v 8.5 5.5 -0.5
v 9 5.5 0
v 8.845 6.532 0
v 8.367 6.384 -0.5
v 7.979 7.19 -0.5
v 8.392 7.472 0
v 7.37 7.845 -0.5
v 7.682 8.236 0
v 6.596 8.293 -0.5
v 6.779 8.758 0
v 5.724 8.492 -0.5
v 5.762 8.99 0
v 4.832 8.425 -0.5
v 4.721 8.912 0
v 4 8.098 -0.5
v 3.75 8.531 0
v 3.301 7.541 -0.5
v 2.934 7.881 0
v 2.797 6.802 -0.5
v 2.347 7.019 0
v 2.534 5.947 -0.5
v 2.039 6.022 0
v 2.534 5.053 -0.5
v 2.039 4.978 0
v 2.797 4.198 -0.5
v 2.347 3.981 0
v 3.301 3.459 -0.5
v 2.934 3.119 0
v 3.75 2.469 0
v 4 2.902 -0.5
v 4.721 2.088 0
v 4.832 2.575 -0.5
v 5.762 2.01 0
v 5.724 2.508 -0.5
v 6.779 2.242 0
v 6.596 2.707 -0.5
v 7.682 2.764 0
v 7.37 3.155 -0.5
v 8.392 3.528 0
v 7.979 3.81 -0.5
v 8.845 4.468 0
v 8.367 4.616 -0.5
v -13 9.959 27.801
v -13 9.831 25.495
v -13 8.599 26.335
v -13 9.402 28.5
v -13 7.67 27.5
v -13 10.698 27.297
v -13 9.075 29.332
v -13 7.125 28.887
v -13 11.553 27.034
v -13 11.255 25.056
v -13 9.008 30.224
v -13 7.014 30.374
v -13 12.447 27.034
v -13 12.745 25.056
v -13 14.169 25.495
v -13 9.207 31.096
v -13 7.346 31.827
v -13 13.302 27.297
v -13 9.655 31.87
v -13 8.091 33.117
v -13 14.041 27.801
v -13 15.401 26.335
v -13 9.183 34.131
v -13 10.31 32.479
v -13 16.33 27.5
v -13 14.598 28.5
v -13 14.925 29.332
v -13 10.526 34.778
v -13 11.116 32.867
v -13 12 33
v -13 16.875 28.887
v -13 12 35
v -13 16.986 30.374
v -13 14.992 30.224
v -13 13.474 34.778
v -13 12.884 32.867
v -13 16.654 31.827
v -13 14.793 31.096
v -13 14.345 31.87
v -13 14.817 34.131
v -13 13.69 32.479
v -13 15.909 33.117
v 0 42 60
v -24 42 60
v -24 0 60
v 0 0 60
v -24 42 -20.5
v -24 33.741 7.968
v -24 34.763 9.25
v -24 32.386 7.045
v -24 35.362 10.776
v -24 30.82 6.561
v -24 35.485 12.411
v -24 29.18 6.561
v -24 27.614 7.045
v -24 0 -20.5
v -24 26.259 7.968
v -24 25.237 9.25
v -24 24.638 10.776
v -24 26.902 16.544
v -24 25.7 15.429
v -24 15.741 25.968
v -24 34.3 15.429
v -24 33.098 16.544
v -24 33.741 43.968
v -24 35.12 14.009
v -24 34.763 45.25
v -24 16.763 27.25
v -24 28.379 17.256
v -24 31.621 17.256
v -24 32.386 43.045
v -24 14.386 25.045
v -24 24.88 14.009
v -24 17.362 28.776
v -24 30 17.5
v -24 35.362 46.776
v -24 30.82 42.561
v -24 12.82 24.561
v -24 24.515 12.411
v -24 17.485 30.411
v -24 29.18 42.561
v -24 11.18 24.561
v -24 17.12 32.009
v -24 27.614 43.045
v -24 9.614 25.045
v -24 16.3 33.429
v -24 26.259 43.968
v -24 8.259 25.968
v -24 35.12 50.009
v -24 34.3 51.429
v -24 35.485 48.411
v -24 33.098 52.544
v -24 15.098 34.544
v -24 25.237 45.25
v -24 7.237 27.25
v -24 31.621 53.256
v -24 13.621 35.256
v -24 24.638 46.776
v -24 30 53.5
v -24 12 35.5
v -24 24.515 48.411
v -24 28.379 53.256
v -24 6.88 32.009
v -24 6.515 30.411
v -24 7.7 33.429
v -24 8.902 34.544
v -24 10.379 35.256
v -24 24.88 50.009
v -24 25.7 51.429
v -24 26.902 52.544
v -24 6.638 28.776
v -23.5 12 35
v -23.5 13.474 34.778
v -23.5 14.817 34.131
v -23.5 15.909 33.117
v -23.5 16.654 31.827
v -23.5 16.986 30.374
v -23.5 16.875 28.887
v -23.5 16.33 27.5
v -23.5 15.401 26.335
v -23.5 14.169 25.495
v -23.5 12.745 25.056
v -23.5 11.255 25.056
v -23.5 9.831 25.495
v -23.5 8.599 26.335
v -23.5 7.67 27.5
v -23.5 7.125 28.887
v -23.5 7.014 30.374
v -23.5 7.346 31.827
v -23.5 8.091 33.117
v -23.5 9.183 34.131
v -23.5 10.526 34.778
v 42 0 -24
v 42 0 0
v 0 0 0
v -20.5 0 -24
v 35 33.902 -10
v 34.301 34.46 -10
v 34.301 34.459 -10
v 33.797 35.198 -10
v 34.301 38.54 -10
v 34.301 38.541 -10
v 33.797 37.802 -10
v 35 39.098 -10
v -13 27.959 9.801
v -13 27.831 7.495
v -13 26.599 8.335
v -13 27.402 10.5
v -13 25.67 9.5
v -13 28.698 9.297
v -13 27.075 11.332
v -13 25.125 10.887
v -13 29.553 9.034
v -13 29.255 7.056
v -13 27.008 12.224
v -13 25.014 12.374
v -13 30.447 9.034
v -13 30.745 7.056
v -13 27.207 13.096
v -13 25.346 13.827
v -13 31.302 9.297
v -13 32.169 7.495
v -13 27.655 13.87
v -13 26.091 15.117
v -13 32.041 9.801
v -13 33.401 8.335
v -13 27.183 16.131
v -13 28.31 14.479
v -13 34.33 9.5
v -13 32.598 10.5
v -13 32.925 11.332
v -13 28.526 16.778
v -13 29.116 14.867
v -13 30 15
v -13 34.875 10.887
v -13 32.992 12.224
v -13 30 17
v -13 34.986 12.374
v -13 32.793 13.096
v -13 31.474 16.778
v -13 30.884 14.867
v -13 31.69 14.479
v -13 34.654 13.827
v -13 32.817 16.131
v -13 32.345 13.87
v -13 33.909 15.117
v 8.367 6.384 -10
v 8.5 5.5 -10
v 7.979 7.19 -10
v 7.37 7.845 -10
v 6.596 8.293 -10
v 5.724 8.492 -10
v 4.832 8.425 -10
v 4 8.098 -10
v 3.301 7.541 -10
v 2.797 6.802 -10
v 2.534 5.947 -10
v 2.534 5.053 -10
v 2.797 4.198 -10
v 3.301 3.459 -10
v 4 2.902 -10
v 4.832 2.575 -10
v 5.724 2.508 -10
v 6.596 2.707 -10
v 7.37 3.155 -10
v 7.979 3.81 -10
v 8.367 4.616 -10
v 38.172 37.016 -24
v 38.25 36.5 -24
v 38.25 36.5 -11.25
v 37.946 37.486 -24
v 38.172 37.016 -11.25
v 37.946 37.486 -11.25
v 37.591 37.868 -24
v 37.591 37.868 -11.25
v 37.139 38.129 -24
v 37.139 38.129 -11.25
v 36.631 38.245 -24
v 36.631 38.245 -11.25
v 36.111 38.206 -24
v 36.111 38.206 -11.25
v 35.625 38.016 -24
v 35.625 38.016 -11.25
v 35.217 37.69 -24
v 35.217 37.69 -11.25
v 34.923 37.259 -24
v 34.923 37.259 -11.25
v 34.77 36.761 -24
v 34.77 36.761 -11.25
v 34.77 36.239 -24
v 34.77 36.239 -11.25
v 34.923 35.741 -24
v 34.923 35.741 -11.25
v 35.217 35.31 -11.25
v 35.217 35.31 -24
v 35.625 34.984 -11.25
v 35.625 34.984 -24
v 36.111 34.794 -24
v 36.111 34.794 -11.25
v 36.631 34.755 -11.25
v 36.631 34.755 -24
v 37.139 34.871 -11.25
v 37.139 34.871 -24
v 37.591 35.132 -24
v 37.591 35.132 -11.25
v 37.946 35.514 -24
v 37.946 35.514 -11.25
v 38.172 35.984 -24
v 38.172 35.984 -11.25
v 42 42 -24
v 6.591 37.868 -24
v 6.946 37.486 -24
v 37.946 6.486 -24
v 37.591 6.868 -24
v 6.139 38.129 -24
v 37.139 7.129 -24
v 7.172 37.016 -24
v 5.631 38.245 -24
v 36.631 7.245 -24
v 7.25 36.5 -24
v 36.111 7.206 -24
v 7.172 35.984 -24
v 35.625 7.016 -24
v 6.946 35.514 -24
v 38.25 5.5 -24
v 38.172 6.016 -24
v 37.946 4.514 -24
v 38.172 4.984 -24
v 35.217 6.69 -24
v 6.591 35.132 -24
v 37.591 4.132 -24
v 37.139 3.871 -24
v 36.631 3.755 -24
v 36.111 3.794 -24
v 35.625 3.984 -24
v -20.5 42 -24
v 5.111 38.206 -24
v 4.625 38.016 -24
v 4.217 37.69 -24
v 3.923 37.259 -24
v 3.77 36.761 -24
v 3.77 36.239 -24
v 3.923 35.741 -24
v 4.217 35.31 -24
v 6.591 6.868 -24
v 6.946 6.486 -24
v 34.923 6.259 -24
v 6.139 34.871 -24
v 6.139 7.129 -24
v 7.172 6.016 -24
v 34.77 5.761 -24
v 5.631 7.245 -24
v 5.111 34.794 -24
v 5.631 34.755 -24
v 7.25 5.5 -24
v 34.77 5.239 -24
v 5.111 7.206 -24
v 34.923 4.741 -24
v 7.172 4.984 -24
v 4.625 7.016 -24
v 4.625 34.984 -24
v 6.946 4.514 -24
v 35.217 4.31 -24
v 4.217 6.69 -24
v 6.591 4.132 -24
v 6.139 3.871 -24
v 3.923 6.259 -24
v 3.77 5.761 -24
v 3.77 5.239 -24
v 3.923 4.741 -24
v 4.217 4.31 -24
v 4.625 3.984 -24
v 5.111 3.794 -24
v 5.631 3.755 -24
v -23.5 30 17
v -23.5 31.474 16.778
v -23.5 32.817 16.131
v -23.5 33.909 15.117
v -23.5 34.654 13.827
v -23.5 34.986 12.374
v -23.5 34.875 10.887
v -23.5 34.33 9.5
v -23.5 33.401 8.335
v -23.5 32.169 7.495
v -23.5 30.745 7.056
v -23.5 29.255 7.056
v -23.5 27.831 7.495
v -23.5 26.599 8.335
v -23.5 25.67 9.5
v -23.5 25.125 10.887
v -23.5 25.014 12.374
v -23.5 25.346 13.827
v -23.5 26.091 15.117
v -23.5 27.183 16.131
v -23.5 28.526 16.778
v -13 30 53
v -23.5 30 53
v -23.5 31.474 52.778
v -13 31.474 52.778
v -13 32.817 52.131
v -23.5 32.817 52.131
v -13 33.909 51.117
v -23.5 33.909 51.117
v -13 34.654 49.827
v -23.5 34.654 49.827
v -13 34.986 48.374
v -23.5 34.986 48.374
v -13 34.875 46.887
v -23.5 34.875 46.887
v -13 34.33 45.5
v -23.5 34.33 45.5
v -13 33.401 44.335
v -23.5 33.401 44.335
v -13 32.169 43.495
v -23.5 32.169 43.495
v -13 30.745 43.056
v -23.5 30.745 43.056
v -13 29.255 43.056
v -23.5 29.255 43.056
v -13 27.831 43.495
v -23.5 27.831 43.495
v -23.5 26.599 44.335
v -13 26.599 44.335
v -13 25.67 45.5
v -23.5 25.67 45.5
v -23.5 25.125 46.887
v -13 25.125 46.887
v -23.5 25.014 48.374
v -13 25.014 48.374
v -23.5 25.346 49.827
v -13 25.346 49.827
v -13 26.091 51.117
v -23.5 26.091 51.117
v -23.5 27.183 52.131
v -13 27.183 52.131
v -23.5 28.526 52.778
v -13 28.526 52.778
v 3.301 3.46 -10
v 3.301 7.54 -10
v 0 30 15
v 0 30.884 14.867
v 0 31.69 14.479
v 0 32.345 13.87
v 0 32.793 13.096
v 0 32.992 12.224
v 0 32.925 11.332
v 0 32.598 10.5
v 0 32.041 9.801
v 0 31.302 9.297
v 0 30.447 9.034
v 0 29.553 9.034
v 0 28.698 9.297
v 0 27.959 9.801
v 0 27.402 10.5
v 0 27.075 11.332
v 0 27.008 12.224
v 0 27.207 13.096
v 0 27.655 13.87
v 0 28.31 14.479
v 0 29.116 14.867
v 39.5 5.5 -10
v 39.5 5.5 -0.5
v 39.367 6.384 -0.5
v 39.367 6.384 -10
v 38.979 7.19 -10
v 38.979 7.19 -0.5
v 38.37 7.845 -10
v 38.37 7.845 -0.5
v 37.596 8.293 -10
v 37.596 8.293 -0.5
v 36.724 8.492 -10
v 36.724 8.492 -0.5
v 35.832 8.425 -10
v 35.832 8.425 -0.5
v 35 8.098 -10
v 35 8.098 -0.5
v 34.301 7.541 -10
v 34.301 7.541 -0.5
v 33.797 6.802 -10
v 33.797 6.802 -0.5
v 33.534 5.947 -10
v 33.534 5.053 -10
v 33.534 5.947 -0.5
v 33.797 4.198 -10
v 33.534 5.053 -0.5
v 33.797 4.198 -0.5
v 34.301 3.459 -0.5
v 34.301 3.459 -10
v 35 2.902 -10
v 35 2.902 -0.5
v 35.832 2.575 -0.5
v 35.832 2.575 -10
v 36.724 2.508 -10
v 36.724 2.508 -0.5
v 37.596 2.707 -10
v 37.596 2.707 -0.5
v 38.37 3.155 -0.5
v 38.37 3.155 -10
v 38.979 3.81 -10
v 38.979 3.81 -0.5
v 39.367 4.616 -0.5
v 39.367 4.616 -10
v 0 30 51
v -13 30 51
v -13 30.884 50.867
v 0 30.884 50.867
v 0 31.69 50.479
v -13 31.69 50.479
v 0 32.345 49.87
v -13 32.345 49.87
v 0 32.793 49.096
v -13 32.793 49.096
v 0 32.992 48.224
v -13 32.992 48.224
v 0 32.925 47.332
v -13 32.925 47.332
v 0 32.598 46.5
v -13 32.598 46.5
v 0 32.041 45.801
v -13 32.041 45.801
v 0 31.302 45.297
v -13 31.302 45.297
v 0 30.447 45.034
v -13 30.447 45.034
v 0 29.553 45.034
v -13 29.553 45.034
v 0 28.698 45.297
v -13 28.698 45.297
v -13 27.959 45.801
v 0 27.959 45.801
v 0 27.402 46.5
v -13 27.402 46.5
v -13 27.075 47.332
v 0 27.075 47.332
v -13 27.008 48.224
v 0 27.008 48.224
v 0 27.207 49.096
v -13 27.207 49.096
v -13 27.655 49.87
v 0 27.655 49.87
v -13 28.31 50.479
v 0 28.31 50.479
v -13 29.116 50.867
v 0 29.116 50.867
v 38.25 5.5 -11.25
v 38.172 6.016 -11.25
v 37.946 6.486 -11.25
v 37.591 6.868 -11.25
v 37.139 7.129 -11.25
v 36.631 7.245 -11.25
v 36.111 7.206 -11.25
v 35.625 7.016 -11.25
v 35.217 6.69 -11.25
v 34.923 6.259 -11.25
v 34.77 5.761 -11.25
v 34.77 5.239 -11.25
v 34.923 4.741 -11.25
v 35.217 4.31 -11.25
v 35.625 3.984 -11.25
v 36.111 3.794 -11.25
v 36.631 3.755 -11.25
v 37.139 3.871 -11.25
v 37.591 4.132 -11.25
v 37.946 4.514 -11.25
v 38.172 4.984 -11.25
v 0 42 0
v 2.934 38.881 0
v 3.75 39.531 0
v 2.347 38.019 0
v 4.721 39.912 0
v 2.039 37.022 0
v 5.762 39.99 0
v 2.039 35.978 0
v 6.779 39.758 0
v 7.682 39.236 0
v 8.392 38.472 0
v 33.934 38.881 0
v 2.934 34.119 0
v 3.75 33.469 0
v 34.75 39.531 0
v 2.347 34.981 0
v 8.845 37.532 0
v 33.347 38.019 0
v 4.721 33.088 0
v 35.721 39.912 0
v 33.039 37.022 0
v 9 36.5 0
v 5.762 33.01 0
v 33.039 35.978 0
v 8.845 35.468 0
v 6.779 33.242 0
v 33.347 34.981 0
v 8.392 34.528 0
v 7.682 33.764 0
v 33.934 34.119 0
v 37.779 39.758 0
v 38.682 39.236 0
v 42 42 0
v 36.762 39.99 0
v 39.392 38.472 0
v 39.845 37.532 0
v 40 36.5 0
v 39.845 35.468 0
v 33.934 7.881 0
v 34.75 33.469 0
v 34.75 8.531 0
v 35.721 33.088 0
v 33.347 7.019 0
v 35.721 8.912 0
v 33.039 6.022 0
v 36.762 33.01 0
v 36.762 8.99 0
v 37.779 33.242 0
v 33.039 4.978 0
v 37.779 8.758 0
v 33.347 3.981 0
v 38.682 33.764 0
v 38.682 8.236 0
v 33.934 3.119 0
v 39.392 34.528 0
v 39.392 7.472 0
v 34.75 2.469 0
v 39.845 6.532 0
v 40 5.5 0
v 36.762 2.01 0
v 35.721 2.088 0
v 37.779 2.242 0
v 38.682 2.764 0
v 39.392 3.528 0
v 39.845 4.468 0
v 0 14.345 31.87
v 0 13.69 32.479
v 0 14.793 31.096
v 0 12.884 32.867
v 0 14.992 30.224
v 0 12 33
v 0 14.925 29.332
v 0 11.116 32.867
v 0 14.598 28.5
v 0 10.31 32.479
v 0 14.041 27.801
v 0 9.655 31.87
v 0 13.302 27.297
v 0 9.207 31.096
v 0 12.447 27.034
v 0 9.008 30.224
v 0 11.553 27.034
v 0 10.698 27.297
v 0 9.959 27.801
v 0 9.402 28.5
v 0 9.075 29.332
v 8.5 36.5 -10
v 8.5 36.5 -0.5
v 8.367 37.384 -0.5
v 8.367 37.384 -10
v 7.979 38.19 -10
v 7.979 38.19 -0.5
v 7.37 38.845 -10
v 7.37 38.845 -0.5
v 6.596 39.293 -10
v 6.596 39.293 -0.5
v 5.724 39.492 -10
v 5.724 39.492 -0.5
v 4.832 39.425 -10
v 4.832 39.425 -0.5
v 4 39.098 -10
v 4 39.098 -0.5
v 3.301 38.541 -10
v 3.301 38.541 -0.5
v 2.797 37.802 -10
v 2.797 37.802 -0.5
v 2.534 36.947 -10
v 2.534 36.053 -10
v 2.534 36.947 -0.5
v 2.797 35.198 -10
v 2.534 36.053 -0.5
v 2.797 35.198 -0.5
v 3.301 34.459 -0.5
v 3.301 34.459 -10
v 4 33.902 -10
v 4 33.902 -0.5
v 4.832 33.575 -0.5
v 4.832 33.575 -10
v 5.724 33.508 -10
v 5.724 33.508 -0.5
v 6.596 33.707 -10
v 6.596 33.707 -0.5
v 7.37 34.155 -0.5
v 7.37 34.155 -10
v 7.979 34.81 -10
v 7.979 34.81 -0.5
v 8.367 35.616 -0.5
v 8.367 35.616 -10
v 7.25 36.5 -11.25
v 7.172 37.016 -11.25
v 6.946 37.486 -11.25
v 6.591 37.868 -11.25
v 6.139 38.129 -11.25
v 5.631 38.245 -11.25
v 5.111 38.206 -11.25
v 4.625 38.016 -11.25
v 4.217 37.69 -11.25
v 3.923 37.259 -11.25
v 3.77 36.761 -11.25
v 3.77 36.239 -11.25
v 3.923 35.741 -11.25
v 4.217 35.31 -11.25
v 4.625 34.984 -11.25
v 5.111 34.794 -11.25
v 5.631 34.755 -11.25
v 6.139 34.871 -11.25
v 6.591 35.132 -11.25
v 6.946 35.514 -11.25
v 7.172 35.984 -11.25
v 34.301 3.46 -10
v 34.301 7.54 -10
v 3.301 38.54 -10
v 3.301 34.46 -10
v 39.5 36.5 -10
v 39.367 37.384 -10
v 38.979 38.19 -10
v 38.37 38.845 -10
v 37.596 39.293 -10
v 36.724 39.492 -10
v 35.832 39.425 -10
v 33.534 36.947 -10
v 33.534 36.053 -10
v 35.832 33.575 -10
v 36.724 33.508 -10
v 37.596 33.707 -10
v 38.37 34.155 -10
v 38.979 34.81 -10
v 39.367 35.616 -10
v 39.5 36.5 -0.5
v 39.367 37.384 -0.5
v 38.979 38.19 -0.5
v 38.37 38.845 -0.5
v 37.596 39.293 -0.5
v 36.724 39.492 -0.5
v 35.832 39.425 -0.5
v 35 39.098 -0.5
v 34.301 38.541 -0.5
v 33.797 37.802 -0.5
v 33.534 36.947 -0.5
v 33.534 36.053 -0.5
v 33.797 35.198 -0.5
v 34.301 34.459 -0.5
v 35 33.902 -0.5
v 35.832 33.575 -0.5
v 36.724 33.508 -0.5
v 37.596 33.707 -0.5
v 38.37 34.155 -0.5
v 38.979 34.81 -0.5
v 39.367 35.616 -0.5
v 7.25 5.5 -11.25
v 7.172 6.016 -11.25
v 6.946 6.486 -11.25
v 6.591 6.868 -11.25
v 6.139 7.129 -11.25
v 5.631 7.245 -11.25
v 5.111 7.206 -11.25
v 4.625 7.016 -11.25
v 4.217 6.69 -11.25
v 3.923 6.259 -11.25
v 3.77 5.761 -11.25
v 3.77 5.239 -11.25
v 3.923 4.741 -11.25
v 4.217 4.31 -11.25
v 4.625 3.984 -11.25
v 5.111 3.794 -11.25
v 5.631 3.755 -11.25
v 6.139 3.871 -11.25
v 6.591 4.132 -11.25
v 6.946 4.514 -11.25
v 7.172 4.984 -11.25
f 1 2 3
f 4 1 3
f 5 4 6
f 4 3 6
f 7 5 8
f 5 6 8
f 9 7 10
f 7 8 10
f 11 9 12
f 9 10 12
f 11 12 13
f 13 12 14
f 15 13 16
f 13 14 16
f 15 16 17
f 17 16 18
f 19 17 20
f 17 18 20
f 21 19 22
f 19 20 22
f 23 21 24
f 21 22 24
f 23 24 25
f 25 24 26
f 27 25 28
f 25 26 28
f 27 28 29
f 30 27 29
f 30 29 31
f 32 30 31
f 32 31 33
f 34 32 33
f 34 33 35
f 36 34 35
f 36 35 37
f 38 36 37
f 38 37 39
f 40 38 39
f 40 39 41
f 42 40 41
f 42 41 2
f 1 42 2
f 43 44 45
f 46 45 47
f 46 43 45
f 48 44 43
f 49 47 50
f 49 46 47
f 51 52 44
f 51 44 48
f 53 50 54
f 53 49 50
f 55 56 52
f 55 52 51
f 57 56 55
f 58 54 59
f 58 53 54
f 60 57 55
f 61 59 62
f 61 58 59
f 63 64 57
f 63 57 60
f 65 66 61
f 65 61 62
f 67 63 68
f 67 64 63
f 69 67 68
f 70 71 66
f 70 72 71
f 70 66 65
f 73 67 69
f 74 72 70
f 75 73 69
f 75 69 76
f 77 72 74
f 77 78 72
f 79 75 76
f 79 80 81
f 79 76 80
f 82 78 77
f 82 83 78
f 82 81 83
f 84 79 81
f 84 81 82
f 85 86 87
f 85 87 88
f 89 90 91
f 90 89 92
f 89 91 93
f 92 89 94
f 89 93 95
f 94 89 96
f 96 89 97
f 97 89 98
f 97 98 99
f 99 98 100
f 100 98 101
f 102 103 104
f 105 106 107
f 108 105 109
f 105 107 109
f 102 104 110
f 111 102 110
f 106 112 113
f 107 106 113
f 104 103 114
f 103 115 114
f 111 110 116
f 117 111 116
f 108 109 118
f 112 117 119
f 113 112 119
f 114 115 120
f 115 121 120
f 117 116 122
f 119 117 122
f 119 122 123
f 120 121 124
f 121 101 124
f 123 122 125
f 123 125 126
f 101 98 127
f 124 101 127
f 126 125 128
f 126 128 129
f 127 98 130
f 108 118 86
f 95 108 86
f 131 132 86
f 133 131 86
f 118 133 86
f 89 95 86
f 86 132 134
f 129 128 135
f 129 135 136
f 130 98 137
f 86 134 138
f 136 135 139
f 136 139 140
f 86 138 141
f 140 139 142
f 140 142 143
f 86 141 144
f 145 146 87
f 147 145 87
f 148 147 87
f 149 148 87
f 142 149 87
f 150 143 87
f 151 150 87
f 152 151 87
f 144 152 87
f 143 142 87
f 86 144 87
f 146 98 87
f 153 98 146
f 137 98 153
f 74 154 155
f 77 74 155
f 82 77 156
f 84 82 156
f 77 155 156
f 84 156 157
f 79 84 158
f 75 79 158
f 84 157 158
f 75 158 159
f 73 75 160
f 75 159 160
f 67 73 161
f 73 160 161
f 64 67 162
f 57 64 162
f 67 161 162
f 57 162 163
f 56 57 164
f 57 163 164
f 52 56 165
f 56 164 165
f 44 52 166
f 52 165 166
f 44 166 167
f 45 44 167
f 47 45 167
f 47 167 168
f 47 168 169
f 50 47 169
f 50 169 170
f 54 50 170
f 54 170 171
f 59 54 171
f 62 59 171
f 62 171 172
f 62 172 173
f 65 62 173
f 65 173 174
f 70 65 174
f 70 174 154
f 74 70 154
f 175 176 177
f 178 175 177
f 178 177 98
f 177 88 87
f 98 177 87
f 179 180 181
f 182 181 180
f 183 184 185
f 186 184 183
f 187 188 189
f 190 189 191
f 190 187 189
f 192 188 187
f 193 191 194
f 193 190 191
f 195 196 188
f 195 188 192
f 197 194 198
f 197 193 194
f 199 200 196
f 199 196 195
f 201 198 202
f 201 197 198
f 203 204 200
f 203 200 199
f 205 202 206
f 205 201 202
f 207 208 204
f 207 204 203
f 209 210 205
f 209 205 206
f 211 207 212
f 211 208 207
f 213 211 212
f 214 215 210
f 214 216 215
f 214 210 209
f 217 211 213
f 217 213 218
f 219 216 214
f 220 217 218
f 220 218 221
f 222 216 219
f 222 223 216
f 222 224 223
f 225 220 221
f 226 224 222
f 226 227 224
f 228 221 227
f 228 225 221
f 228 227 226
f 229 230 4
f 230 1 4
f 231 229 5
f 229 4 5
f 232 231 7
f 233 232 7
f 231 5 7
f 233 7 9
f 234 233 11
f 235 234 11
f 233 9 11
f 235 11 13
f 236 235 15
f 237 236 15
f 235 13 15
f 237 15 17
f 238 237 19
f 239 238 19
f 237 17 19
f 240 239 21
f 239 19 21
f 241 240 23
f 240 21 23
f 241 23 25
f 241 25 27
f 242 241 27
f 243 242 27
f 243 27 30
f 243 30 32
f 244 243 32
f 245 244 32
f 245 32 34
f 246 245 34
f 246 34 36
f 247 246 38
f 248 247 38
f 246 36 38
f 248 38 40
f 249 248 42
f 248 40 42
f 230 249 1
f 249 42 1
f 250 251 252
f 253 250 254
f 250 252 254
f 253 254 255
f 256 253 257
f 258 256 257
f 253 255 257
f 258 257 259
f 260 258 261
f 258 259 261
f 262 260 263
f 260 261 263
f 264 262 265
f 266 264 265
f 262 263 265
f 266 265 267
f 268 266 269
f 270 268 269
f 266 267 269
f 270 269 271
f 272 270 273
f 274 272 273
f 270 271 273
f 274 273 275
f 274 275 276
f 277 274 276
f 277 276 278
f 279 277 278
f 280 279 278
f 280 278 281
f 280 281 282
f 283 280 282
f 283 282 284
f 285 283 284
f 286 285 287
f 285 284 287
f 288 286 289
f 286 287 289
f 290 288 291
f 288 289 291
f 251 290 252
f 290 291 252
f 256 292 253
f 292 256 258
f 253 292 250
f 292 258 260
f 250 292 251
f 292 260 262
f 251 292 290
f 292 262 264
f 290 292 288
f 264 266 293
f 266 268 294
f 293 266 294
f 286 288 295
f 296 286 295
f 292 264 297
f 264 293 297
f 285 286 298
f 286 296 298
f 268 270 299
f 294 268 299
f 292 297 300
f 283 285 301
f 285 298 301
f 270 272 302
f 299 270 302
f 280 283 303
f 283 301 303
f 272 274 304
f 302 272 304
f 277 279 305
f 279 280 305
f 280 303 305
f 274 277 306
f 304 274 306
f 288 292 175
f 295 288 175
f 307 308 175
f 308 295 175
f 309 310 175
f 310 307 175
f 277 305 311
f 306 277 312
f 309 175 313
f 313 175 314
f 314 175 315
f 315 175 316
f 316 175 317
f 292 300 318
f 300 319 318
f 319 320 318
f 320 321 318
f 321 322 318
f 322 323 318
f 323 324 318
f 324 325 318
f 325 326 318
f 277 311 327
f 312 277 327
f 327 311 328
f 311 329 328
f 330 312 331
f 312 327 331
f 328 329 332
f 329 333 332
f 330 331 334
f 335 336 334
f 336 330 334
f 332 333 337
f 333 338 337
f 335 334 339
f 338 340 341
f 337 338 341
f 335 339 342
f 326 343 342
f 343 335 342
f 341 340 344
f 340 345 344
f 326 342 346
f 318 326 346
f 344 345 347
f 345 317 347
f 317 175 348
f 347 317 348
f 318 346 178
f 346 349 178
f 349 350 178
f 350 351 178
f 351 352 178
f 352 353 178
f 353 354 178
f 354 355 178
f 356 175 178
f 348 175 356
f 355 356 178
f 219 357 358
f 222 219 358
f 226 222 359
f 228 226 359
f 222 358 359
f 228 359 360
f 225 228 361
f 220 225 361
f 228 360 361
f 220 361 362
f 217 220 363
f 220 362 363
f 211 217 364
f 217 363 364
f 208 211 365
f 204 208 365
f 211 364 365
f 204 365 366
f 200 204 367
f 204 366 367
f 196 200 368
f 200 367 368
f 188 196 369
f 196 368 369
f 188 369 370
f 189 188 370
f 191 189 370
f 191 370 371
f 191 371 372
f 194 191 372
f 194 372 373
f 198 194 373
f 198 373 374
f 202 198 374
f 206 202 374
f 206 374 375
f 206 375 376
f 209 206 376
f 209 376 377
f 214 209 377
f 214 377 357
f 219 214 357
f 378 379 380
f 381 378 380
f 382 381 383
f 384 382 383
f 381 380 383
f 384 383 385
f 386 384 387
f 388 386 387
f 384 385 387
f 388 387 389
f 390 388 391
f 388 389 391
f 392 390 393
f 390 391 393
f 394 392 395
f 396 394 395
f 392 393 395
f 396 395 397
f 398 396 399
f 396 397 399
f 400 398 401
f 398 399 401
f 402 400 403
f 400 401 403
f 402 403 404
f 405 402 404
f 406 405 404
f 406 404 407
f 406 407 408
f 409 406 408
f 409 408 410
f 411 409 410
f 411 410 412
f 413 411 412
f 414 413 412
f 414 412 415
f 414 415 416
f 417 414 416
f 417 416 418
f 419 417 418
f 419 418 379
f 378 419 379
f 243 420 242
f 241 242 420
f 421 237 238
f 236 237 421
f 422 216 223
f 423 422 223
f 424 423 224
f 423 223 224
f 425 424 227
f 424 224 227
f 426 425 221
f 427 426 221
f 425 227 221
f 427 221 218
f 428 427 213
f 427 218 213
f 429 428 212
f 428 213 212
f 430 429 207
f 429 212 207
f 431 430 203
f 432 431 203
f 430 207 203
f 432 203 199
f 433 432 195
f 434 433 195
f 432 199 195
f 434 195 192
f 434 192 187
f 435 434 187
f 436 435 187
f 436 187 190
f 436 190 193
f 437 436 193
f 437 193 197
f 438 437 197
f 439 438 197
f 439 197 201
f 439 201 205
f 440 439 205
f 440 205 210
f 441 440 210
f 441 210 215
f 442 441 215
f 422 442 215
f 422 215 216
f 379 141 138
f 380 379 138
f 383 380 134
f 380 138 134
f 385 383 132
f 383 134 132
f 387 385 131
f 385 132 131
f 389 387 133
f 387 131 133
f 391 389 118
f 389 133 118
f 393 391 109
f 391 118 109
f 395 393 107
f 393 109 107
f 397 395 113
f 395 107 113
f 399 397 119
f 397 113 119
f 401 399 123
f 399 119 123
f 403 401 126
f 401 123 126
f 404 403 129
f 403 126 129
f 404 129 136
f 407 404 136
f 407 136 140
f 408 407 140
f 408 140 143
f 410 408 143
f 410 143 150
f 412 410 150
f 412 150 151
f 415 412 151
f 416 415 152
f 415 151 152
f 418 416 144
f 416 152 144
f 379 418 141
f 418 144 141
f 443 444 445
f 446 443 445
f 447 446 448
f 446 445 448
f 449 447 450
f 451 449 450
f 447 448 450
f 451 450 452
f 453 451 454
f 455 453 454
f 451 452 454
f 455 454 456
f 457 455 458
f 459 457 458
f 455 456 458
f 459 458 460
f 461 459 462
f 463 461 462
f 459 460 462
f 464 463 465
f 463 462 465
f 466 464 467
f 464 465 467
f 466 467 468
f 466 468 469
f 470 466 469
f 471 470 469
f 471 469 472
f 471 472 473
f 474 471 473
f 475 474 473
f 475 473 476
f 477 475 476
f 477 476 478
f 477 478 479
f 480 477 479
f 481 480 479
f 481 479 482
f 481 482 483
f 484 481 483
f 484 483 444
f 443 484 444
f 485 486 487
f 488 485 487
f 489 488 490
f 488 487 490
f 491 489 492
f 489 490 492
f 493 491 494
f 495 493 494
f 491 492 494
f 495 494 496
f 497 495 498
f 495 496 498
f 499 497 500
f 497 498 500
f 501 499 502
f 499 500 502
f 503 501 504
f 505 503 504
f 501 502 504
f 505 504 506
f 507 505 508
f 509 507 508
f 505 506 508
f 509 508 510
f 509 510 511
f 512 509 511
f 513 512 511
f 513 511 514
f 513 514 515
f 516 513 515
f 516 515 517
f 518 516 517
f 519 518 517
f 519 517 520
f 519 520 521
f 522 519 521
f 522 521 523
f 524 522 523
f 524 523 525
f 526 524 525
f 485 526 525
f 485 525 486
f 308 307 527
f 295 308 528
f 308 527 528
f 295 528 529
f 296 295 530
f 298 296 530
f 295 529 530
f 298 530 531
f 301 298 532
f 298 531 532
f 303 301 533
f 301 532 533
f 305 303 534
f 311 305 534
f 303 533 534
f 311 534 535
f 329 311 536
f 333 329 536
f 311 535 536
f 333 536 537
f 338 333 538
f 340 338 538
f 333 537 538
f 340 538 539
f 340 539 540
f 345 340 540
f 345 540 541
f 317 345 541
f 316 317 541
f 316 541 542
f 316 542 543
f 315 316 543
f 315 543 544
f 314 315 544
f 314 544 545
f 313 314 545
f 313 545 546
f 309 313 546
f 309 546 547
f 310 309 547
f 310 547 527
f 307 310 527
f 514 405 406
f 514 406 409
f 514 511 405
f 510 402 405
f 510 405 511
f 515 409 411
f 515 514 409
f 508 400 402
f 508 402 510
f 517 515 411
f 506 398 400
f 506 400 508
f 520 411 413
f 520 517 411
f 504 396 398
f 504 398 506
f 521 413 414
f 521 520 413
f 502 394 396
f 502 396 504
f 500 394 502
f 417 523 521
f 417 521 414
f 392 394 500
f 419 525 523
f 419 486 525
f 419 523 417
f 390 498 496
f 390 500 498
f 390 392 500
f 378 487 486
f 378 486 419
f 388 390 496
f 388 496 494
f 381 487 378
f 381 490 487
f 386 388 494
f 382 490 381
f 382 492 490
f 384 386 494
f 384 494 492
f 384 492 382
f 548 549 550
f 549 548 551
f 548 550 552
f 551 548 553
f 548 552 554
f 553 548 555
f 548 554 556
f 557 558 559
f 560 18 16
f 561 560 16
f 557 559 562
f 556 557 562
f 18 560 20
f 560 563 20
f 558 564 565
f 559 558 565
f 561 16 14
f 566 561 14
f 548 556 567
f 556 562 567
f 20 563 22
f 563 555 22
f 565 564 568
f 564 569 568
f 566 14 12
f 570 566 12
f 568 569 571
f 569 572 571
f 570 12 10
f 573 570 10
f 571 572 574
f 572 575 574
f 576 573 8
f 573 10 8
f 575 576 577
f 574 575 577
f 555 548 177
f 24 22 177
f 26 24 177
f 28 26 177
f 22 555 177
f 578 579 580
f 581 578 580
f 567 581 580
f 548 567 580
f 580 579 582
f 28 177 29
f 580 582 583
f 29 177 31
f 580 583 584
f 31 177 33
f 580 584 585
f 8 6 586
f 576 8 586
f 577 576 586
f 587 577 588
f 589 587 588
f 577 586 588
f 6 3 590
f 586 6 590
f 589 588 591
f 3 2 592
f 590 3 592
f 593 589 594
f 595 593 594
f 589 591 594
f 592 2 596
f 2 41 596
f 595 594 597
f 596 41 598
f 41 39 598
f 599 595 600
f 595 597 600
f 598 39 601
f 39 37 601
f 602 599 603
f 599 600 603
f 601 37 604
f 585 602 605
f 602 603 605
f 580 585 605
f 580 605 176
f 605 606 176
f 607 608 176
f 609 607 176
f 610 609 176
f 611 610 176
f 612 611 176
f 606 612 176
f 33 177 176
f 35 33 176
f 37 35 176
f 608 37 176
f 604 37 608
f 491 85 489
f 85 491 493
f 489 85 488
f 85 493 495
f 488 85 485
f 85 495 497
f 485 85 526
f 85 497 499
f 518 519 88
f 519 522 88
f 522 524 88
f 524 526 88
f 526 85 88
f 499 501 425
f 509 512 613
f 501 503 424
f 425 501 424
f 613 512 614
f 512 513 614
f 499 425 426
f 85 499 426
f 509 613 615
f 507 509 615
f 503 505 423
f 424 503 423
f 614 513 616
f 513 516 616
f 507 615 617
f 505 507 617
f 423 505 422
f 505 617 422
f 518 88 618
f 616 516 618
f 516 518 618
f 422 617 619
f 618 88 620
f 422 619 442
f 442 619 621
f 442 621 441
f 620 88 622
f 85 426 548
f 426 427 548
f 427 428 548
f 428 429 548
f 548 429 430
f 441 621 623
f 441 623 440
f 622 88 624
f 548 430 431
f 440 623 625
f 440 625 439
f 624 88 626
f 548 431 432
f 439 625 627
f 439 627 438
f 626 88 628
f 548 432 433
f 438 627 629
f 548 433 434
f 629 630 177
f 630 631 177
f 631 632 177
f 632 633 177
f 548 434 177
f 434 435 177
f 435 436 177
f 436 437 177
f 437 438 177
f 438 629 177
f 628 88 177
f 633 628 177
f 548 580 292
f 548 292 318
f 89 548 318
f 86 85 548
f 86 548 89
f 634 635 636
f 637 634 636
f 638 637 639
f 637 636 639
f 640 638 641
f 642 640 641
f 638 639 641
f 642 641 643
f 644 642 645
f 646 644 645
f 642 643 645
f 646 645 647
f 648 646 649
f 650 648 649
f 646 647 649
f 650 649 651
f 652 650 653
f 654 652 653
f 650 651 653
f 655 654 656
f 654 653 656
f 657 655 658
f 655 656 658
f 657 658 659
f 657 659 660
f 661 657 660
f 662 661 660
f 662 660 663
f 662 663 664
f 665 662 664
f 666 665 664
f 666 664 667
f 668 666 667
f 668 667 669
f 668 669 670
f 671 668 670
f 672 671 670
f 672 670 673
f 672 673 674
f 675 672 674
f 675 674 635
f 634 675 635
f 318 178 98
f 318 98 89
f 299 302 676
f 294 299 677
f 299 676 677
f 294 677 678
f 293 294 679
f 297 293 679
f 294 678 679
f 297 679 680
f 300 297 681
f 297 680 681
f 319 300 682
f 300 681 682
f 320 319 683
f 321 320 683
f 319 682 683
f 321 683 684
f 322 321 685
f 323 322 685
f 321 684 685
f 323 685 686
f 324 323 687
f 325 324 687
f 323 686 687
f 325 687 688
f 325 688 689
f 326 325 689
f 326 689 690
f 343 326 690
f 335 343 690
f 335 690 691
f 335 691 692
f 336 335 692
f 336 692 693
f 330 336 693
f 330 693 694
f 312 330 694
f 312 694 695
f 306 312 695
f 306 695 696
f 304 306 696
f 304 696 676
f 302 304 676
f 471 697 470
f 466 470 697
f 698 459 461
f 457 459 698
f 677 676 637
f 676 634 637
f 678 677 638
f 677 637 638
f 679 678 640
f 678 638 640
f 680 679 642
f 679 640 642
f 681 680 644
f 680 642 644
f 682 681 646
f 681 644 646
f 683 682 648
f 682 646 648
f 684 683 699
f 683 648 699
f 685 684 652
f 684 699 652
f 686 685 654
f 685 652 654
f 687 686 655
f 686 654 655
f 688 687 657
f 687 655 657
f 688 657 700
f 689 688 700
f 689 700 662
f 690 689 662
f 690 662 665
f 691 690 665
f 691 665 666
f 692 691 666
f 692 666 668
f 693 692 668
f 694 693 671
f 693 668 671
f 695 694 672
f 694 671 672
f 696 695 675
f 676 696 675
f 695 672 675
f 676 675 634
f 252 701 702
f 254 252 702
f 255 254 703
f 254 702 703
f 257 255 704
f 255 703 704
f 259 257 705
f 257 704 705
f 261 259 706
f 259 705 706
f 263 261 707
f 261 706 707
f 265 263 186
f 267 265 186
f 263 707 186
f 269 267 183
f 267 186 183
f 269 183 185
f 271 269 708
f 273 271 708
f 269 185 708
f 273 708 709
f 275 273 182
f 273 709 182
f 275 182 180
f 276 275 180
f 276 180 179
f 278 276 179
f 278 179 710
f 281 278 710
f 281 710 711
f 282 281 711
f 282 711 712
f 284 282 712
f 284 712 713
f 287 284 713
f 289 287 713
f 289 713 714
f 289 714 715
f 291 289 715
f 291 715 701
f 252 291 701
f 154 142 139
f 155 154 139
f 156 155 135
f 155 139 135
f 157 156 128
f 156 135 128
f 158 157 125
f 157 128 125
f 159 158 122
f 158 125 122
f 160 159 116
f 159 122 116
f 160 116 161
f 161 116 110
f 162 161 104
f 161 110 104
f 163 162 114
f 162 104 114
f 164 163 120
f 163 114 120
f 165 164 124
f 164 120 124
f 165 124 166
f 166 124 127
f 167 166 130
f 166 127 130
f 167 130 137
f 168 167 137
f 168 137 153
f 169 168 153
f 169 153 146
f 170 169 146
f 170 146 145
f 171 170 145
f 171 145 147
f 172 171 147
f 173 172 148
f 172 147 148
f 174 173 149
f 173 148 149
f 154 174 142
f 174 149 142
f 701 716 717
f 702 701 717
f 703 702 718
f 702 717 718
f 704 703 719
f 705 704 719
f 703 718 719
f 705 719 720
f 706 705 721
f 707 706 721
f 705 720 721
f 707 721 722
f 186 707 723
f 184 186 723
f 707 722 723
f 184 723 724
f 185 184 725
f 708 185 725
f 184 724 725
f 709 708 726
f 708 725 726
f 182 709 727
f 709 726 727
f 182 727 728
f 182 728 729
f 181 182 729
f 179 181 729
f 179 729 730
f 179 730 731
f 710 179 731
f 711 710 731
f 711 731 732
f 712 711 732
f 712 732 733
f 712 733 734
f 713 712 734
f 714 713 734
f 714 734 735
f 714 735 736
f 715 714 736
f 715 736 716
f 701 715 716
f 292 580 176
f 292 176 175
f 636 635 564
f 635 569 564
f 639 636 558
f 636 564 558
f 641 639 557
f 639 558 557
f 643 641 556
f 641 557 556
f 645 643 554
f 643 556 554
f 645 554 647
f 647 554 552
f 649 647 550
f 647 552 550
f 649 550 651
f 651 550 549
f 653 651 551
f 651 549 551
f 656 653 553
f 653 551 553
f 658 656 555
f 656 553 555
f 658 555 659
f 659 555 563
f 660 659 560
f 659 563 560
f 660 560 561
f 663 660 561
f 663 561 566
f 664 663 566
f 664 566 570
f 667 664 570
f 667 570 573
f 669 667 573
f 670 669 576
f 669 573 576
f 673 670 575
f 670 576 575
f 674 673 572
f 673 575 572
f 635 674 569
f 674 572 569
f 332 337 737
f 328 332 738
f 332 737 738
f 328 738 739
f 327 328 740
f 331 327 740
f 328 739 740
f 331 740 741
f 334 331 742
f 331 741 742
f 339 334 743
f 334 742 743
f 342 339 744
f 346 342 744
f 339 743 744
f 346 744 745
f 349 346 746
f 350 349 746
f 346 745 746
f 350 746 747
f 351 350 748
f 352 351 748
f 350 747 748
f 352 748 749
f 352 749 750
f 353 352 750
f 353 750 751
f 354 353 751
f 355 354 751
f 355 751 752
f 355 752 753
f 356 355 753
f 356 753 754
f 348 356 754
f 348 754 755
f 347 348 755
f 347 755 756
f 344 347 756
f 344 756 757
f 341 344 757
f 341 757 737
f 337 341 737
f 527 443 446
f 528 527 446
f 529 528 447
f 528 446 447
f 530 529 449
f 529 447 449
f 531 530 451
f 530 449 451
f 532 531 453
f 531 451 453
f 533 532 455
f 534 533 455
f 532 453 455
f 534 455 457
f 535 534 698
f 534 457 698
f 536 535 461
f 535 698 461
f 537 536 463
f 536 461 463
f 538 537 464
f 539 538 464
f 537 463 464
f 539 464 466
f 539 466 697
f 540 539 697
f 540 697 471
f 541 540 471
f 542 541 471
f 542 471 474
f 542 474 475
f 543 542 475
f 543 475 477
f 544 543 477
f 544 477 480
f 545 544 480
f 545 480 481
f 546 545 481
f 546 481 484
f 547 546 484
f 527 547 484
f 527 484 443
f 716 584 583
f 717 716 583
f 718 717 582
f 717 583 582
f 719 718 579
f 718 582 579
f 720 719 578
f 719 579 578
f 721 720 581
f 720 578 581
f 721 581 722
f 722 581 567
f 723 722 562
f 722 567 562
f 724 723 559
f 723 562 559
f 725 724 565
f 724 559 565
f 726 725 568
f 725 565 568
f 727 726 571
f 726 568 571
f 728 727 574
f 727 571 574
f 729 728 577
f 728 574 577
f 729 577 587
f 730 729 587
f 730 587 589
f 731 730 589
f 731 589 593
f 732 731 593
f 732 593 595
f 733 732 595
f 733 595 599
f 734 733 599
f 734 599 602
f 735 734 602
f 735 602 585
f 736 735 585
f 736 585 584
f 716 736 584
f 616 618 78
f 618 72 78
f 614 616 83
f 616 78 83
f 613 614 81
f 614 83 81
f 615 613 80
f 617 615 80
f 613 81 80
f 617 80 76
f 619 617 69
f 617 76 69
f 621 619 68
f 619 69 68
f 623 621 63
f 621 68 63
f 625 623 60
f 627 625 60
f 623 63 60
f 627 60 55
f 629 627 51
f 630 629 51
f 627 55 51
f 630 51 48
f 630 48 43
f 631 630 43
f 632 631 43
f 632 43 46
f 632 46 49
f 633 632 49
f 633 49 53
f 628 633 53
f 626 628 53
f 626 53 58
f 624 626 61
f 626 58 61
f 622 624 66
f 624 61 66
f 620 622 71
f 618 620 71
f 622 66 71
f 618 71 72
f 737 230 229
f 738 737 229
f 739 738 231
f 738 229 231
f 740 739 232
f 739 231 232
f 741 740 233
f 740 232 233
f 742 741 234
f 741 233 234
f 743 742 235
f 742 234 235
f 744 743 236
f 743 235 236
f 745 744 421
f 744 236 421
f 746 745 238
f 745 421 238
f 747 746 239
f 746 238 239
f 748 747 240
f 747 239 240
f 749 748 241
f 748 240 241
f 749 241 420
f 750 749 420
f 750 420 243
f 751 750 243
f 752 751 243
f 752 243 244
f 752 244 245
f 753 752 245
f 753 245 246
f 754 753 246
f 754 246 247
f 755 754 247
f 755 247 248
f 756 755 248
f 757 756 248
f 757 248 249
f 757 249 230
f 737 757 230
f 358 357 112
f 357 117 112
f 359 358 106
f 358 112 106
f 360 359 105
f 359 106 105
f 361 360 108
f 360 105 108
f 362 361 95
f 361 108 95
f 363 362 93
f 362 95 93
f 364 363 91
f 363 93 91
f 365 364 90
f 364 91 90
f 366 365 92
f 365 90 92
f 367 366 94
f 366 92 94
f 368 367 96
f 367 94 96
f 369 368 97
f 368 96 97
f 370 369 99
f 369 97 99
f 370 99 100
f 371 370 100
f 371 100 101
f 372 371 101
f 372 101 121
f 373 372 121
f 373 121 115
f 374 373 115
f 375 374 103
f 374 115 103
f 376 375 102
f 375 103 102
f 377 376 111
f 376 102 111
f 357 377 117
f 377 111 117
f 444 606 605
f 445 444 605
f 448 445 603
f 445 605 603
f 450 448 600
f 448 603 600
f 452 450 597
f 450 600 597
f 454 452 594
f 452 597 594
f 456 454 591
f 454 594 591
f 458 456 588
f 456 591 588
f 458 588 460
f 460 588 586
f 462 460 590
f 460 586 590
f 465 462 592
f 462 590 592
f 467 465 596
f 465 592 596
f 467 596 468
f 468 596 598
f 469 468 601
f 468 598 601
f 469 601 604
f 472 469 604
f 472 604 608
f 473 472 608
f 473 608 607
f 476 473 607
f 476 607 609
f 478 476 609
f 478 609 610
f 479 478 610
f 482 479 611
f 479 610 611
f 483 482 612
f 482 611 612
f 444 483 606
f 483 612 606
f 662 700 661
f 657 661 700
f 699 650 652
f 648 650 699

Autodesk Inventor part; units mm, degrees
ref_plane "YZ Plane" through (0, 0, 0) normal (1, 0, 0) x (0, 1, 0)
ref_plane "XZ Plane" through (0, 0, 0) normal (0, 1, 0) x (-1, 0, 0)
ref_plane "XY Plane" through (0, 0, 0) normal (0, 0, 1) x (1, 0, 0)
sketch "Sketch1" plane through (0, 0, 0) normal (0, 1, 0) x (-1, 0, 0)
  line L0 (0, 0) -> (-42, 0)
  line L1 (-42, 0) -> (-42, -24)
  line L2 (-42, -24) -> (24, -24)
  line L3 (24, -24) -> (24, 60)
  line L4 (24, 60) -> (0, 60)
  line L5 (0, 60) -> (0, 0)
  dimension "d0" = 24
  dimension "d1" = 42
  dimension "d2" = 24
  dimension "d3" = 60
extrude "Extrusion1" add sketch "Sketch1" along normal blind 42
sketch "Sketch2" plane through (0, 0, 0) normal (0, 0, 1) x (1, 0, 0)
  circle A0 centre (5.5, 36.5) radius 1.75
  circle A1 centre (36.5, 36.5) radius 1.75
  circle A2 centre (36.5, 5.5) radius 1.75
  circle A3 centre (5.5, 5.5) radius 1.75
  line L0 (42, 0) -> (42, 42) projected
  line L1 (0, 42) -> (42, 42) projected
  point P0 (0, 0)
  dimension "d6" = 3.5
  dimension "d7" = 5.5
  dimension "d8" = 5.5
  dimension "d9" = 31
  dimension "d10" = 31
extrude "Extrusion2" cut sketch "Sketch2" against normal blind 42
sketch "Sketch3" plane through (0, 0, 60) normal (1, 0, 0) x (0, 0, -1)
  circle A0 centre (12, 30) radius 5
  circle A1 centre (30, 12) radius 5
  circle A2 centre (48, 30) radius 5
  line L0 (12, 30) -> (30, 12) construction
  line L1 (30, 12) -> (48, 30) construction
  line L2 (0, 42) -> (60, 42) construction
  line L3 (0, 0) -> (0, 42) construction
  line L4 (0, 0) -> (60, 0) construction
  line L5 (60, 0) -> (60, 42) construction
  dimension "d13" = 12
  dimension "d14" = 12
  dimension "d15" = 12
  dimension "d16" = 10
  dimension "d17" = 12
sketch "Sketch4" plane through (-24, 0, -24) normal (-1, 0, 0) x (0, 0, 1)
  circle A0 centre (54, 12) radius 5 projected
  circle A1 centre (36, 30) radius 5 projected
  circle A2 centre (72, 30) radius 5 projected
  circle A3 centre (54, 12) radius 3
  circle A4 centre (36, 30) radius 3
  circle A5 centre (72, 30) radius 3
  point P0 (24, 0)
  dimension "d20" = 6
extrude "Extrusion3" cut sketch "Sketch4" against normal blind 11 contours A0 | A1 | A2 | A3 | A4 | A5
extrude "Extrusion4" cut sketch "Sketch4" against normal blind 32.5 contours A3 | A4 | A5
sketch "Sketch6" plane through (0, 0, 0) normal (0, 0, 1) x (1, 0, 0)
  circle A0 centre (36.5, 5.5) radius 1.75 construction
  circle A1 centre (5.5, 5.5) radius 1.75 construction
  circle A2 centre (5.5, 36.5) radius 1.75 construction
  circle A3 centre (36.5, 36.5) radius 1.75 construction
  circle A4 centre (36.5, 5.5) radius 3
  circle A5 centre (5.5, 5.5) radius 3
  circle A6 centre (5.5, 36.5) radius 3
  circle A7 centre (36.5, 36.5) radius 3
  point P0 (0, 0)
  dimension "d23" = 6
extrude "Extrusion5" cut sketch "Sketch6" against normal blind 10
chamfer "Chamfer1" distance 1.25 angle 45 4 edges at (3.75, 5.5, -10) (3.75, 36.5, -10) (34.75, 36.5, -10) (34.75, 5.5, -10)
chamfer "Chamfer2" distance 0.5 angle 45 7 edges at (33.5, 5.5, 0) (2.5, 5.5, 0) (2.5, 36.5, 0) (33.5, 36.5, 0) (-24, 12, 25) (-24, 30, 7) (-24, 30, 43)
chamfer "Chamfer3" distance 3.5 angle 45 1 edges at (-24, 21, -24)
properties part number "XaxisMotorMount_3DPrint"
